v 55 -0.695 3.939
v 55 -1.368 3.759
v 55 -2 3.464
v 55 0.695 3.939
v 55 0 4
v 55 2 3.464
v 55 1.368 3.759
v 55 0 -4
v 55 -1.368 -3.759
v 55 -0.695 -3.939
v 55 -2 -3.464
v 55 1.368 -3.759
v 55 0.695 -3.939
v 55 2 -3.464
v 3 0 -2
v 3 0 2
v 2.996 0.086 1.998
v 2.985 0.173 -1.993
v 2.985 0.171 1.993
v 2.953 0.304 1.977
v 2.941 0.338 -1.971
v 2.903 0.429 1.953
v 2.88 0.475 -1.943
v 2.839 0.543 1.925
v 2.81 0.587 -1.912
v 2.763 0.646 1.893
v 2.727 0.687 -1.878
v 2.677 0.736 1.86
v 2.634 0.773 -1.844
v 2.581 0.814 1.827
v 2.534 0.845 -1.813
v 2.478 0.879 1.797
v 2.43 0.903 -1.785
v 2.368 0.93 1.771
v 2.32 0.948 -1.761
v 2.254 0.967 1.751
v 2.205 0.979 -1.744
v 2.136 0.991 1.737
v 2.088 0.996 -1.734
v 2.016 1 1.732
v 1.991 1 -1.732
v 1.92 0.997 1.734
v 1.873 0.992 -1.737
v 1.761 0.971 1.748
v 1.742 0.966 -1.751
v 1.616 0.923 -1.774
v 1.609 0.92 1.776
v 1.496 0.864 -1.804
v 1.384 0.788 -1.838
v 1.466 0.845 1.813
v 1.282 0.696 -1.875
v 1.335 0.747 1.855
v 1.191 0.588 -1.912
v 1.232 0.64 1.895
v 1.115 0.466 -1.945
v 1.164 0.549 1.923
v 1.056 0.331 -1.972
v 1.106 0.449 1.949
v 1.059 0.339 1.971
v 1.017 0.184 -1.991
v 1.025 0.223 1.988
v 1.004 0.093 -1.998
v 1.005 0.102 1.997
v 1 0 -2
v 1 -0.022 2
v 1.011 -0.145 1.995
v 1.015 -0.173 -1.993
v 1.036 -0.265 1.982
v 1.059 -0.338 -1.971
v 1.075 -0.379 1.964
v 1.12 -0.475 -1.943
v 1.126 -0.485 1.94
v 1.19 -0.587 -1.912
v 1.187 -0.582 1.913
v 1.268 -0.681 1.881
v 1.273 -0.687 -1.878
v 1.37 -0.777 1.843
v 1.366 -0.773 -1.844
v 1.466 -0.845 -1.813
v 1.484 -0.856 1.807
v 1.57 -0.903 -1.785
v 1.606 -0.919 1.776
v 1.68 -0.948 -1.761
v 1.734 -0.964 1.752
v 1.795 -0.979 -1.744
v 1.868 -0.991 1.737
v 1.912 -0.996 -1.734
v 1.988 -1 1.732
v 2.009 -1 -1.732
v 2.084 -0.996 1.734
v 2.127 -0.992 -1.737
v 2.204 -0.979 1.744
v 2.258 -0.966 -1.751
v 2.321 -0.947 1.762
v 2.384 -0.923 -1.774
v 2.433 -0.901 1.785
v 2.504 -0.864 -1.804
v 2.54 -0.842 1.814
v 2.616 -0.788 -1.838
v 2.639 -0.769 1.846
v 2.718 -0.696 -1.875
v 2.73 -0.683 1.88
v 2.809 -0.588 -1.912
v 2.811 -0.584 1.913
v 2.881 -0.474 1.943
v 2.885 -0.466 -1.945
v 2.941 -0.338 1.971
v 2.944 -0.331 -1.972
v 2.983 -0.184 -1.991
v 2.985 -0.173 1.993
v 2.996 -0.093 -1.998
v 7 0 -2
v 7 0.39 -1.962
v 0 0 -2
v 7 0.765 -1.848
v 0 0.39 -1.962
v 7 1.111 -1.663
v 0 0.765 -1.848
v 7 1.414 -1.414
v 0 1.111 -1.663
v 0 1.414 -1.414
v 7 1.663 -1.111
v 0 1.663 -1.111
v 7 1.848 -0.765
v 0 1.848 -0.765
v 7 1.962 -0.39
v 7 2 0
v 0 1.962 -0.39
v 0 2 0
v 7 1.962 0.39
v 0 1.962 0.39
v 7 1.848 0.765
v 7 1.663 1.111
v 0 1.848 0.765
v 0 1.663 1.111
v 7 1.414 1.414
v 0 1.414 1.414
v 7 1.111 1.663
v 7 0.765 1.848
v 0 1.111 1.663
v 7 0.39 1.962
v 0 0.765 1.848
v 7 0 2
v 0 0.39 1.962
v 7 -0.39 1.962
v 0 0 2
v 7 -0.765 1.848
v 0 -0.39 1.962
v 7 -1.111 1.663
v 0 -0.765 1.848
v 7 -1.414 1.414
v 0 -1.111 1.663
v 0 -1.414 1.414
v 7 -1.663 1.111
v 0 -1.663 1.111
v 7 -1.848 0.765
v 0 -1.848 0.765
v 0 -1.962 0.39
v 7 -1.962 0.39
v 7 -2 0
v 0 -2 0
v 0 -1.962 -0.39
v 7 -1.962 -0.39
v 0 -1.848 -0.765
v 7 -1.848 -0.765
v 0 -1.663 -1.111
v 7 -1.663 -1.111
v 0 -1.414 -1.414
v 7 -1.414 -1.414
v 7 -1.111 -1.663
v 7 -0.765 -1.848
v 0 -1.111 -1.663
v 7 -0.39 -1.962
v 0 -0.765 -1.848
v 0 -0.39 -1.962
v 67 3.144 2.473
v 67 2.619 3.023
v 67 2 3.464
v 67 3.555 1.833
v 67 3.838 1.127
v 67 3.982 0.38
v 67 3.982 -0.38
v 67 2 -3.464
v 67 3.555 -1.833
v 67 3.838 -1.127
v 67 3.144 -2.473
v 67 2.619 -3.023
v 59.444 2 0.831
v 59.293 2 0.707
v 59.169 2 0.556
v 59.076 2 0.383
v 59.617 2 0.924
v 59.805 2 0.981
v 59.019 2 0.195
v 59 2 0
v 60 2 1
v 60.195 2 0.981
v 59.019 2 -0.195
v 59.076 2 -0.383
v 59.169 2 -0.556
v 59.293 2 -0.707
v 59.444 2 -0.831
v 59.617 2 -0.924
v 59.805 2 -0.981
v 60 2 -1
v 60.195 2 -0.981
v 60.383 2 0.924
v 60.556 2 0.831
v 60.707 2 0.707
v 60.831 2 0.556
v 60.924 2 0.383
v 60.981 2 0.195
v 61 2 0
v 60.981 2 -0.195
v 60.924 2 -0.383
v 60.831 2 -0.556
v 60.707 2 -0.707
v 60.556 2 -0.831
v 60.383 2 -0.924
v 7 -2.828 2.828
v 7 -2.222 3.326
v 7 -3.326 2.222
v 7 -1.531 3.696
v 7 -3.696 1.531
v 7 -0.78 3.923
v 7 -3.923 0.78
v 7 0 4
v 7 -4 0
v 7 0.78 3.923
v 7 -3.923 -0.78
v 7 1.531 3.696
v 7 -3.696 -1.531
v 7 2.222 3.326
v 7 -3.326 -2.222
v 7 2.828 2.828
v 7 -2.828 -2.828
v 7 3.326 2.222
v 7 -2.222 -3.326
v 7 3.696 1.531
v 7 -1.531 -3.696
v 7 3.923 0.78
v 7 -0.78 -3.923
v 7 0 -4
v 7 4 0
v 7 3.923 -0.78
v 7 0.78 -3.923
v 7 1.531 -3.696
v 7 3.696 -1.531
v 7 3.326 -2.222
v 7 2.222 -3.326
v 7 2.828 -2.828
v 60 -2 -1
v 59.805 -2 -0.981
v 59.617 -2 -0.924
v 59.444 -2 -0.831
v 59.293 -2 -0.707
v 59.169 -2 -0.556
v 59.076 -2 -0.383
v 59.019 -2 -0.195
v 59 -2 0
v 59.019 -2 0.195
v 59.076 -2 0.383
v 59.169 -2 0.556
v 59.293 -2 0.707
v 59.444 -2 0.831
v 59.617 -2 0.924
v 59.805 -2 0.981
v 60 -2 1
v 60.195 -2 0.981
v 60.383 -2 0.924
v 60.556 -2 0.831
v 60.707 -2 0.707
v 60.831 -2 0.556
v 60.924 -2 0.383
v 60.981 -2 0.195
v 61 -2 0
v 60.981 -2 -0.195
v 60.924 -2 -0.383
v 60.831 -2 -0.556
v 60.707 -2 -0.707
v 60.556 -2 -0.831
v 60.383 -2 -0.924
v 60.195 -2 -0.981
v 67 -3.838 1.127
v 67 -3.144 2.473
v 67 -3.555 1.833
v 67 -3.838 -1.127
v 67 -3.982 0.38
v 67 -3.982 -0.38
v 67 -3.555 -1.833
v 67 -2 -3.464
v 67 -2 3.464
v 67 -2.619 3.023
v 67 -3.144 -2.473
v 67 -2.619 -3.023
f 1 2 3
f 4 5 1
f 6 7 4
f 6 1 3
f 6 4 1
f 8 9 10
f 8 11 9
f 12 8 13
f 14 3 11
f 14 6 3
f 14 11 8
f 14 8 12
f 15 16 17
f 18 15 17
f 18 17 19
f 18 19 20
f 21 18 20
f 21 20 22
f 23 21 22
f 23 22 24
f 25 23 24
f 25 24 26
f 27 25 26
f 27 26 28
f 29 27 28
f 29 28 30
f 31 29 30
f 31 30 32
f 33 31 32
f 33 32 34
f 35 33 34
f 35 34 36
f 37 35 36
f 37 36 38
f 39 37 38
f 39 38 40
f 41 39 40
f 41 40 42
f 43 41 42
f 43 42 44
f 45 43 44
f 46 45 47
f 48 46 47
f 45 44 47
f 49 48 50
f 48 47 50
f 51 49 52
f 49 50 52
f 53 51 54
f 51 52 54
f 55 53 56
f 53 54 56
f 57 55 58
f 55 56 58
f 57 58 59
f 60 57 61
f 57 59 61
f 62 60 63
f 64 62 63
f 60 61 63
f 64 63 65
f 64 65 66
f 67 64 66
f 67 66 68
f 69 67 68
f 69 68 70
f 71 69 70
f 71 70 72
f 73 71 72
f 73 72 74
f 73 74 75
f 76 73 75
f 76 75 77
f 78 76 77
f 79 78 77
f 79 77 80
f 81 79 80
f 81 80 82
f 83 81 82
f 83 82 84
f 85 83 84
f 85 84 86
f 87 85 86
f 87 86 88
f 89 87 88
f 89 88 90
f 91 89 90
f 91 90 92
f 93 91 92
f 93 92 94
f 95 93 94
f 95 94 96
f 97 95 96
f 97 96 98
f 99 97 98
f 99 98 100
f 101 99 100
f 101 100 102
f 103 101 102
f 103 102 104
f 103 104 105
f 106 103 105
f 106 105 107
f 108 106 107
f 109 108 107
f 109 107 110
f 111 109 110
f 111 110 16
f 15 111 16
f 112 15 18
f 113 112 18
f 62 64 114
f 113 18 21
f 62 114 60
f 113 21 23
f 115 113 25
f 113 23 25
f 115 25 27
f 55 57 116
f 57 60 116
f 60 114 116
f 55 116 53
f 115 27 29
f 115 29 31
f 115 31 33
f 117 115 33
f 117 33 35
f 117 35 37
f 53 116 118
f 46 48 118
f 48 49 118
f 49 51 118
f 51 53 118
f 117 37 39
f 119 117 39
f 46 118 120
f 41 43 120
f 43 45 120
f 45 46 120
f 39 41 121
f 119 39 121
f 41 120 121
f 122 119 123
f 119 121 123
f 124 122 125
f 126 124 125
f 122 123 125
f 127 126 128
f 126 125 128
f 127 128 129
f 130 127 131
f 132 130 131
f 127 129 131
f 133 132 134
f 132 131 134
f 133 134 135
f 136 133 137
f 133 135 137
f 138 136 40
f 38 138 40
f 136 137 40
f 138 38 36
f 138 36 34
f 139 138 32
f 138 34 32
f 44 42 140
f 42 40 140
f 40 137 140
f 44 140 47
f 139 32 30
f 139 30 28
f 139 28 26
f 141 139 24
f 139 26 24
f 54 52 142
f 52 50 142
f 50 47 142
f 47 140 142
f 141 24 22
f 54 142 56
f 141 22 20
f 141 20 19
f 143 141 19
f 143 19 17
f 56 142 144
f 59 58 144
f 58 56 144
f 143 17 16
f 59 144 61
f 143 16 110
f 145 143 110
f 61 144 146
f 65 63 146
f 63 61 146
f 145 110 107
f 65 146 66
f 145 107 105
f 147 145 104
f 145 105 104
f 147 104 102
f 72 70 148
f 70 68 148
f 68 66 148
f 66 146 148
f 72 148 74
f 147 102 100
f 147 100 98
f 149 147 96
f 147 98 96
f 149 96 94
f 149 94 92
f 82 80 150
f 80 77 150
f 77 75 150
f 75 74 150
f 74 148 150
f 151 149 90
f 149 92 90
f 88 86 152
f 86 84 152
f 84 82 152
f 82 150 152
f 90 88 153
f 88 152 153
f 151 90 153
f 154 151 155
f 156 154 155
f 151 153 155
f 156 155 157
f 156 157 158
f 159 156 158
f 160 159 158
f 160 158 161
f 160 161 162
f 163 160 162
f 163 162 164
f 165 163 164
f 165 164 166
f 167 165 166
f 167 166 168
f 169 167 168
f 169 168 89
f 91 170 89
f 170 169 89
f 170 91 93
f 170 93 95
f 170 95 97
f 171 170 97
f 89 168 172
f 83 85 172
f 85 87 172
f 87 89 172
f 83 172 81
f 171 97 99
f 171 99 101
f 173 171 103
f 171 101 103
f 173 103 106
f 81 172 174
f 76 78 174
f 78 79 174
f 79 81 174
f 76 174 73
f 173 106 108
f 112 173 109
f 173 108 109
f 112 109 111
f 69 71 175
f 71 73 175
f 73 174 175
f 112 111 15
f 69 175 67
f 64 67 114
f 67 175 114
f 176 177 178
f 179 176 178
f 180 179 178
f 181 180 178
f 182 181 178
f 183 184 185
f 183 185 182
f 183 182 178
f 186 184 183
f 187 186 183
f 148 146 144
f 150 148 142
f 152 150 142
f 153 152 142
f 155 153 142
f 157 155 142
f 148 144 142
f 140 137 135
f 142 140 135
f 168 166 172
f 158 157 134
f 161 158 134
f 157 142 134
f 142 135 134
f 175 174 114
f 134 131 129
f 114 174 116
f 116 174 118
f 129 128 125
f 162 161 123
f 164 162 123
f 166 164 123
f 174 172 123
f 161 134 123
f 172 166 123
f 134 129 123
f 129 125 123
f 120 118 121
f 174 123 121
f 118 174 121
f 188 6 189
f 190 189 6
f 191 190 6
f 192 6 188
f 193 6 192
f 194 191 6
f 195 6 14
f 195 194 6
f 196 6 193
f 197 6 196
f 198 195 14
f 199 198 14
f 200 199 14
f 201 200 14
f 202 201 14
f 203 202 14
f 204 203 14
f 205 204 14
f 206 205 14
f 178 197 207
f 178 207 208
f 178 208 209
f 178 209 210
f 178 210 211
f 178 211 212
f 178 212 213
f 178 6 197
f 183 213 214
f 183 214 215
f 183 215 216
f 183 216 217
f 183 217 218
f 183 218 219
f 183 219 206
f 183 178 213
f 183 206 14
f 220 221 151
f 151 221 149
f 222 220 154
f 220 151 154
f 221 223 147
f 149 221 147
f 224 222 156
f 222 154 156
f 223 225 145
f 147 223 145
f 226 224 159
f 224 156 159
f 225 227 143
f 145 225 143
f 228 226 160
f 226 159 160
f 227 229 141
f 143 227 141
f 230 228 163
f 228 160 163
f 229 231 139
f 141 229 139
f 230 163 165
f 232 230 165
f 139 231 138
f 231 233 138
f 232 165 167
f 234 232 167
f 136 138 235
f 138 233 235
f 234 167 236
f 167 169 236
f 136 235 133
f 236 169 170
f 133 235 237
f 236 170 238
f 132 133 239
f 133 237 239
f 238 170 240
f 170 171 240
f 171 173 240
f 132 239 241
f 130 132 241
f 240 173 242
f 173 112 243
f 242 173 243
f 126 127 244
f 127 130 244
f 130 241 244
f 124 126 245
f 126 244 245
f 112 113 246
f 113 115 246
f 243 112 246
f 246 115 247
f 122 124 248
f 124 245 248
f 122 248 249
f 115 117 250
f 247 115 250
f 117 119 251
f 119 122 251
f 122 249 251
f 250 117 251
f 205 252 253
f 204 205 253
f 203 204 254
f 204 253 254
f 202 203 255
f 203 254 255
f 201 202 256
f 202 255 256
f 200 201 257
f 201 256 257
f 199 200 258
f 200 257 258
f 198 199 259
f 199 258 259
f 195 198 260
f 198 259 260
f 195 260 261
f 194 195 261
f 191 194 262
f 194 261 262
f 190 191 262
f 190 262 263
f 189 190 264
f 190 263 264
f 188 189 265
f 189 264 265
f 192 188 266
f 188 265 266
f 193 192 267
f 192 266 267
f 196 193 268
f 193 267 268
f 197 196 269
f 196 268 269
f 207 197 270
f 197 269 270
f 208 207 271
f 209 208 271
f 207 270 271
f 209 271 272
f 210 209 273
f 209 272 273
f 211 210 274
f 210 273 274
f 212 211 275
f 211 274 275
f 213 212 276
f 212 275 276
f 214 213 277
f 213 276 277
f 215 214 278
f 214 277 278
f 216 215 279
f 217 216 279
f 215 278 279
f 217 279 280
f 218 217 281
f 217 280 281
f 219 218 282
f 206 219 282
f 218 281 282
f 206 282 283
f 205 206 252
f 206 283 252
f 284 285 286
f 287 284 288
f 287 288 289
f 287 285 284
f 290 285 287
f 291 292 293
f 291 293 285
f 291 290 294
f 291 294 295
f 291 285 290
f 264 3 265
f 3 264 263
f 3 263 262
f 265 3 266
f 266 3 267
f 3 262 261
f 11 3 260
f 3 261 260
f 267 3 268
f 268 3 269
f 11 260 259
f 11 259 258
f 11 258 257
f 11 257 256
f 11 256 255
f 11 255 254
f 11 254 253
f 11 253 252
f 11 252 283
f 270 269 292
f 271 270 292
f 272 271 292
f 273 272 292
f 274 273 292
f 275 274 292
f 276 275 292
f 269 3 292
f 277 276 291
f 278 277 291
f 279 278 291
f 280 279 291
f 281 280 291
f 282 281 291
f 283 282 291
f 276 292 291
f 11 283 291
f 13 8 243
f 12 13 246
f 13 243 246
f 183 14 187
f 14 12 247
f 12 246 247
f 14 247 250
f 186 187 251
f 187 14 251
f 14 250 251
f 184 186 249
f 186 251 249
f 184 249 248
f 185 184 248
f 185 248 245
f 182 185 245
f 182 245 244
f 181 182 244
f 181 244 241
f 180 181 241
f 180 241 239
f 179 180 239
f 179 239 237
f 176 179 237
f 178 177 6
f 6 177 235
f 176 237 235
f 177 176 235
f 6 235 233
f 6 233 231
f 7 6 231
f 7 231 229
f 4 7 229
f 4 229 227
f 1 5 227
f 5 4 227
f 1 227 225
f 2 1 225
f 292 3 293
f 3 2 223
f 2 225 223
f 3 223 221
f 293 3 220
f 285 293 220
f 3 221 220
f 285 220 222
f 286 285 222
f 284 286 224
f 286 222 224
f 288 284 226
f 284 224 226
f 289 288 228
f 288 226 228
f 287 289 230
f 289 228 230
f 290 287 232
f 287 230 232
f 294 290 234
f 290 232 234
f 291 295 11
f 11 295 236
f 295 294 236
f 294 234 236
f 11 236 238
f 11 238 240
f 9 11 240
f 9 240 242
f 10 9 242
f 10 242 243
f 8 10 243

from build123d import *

# Parameters (mm, degrees)
SKETCH1_R           = 2
BOSS_EXTRUDE1_DEPTH = 7
SKETCH2_R           = 1
CUT_EXTRUDE1_DEPTH  = 4
SKETCH3_R           = 4
BOSS_EXTRUDE2_DEPTH = 60
SKETCH4_W           = 8.951999976
SKETCH4_H           = 4
CUT_EXTRUDE2_DEPTH  = 12
SKETCH5_R           = 1
BOSS_EXTRUDE3_DEPTH = 4


with BuildPart() as part:
    # Sketch1 → Boss-Extrude1 (new body)
    with BuildSketch(Plane(origin=(0, 0, 0), x_dir=(0, 0, -1), z_dir=(1, 0, 0))):
        Circle(SKETCH1_R)
    extrude(amount=BOSS_EXTRUDE1_DEPTH)

    # Sketch2 → Cut-Extrude1 (cut)
    with BuildSketch(Plane.XY.offset(2)):
        with Locations((2, 0)):
            Circle(SKETCH2_R)
    extrude(amount=-CUT_EXTRUDE1_DEPTH, mode=Mode.SUBTRACT)

    # Sketch3 → Boss-Extrude2 (add)
    with BuildSketch(Plane(origin=(7, 0, 0), x_dir=(0, 0, -1), z_dir=(1, 0, 0))):
        Circle(SKETCH3_R)
    extrude(amount=BOSS_EXTRUDE2_DEPTH)

    # Sketch4 → Cut-Extrude2 (cut)
    with BuildSketch(Plane(origin=(67, 0, 0), x_dir=(0, 0, -1), z_dir=(1, 0, 0))):
        with Locations((-0.118028397, 0)):
            Rectangle(SKETCH4_W, SKETCH4_H)
    extrude(amount=-CUT_EXTRUDE2_DEPTH, mode=Mode.SUBTRACT)

    # Sketch5 → Boss-Extrude3 (add)
    with BuildSketch(Plane(origin=(0, -2, 0), x_dir=(1, 0, 0), z_dir=(0, 1, 0))):
        with Locations(Location((60, 0, 0), (0, 0, 90))):
            Circle(SKETCH5_R)
    extrude(amount=BOSS_EXTRUDE3_DEPTH)


solid = part.part
